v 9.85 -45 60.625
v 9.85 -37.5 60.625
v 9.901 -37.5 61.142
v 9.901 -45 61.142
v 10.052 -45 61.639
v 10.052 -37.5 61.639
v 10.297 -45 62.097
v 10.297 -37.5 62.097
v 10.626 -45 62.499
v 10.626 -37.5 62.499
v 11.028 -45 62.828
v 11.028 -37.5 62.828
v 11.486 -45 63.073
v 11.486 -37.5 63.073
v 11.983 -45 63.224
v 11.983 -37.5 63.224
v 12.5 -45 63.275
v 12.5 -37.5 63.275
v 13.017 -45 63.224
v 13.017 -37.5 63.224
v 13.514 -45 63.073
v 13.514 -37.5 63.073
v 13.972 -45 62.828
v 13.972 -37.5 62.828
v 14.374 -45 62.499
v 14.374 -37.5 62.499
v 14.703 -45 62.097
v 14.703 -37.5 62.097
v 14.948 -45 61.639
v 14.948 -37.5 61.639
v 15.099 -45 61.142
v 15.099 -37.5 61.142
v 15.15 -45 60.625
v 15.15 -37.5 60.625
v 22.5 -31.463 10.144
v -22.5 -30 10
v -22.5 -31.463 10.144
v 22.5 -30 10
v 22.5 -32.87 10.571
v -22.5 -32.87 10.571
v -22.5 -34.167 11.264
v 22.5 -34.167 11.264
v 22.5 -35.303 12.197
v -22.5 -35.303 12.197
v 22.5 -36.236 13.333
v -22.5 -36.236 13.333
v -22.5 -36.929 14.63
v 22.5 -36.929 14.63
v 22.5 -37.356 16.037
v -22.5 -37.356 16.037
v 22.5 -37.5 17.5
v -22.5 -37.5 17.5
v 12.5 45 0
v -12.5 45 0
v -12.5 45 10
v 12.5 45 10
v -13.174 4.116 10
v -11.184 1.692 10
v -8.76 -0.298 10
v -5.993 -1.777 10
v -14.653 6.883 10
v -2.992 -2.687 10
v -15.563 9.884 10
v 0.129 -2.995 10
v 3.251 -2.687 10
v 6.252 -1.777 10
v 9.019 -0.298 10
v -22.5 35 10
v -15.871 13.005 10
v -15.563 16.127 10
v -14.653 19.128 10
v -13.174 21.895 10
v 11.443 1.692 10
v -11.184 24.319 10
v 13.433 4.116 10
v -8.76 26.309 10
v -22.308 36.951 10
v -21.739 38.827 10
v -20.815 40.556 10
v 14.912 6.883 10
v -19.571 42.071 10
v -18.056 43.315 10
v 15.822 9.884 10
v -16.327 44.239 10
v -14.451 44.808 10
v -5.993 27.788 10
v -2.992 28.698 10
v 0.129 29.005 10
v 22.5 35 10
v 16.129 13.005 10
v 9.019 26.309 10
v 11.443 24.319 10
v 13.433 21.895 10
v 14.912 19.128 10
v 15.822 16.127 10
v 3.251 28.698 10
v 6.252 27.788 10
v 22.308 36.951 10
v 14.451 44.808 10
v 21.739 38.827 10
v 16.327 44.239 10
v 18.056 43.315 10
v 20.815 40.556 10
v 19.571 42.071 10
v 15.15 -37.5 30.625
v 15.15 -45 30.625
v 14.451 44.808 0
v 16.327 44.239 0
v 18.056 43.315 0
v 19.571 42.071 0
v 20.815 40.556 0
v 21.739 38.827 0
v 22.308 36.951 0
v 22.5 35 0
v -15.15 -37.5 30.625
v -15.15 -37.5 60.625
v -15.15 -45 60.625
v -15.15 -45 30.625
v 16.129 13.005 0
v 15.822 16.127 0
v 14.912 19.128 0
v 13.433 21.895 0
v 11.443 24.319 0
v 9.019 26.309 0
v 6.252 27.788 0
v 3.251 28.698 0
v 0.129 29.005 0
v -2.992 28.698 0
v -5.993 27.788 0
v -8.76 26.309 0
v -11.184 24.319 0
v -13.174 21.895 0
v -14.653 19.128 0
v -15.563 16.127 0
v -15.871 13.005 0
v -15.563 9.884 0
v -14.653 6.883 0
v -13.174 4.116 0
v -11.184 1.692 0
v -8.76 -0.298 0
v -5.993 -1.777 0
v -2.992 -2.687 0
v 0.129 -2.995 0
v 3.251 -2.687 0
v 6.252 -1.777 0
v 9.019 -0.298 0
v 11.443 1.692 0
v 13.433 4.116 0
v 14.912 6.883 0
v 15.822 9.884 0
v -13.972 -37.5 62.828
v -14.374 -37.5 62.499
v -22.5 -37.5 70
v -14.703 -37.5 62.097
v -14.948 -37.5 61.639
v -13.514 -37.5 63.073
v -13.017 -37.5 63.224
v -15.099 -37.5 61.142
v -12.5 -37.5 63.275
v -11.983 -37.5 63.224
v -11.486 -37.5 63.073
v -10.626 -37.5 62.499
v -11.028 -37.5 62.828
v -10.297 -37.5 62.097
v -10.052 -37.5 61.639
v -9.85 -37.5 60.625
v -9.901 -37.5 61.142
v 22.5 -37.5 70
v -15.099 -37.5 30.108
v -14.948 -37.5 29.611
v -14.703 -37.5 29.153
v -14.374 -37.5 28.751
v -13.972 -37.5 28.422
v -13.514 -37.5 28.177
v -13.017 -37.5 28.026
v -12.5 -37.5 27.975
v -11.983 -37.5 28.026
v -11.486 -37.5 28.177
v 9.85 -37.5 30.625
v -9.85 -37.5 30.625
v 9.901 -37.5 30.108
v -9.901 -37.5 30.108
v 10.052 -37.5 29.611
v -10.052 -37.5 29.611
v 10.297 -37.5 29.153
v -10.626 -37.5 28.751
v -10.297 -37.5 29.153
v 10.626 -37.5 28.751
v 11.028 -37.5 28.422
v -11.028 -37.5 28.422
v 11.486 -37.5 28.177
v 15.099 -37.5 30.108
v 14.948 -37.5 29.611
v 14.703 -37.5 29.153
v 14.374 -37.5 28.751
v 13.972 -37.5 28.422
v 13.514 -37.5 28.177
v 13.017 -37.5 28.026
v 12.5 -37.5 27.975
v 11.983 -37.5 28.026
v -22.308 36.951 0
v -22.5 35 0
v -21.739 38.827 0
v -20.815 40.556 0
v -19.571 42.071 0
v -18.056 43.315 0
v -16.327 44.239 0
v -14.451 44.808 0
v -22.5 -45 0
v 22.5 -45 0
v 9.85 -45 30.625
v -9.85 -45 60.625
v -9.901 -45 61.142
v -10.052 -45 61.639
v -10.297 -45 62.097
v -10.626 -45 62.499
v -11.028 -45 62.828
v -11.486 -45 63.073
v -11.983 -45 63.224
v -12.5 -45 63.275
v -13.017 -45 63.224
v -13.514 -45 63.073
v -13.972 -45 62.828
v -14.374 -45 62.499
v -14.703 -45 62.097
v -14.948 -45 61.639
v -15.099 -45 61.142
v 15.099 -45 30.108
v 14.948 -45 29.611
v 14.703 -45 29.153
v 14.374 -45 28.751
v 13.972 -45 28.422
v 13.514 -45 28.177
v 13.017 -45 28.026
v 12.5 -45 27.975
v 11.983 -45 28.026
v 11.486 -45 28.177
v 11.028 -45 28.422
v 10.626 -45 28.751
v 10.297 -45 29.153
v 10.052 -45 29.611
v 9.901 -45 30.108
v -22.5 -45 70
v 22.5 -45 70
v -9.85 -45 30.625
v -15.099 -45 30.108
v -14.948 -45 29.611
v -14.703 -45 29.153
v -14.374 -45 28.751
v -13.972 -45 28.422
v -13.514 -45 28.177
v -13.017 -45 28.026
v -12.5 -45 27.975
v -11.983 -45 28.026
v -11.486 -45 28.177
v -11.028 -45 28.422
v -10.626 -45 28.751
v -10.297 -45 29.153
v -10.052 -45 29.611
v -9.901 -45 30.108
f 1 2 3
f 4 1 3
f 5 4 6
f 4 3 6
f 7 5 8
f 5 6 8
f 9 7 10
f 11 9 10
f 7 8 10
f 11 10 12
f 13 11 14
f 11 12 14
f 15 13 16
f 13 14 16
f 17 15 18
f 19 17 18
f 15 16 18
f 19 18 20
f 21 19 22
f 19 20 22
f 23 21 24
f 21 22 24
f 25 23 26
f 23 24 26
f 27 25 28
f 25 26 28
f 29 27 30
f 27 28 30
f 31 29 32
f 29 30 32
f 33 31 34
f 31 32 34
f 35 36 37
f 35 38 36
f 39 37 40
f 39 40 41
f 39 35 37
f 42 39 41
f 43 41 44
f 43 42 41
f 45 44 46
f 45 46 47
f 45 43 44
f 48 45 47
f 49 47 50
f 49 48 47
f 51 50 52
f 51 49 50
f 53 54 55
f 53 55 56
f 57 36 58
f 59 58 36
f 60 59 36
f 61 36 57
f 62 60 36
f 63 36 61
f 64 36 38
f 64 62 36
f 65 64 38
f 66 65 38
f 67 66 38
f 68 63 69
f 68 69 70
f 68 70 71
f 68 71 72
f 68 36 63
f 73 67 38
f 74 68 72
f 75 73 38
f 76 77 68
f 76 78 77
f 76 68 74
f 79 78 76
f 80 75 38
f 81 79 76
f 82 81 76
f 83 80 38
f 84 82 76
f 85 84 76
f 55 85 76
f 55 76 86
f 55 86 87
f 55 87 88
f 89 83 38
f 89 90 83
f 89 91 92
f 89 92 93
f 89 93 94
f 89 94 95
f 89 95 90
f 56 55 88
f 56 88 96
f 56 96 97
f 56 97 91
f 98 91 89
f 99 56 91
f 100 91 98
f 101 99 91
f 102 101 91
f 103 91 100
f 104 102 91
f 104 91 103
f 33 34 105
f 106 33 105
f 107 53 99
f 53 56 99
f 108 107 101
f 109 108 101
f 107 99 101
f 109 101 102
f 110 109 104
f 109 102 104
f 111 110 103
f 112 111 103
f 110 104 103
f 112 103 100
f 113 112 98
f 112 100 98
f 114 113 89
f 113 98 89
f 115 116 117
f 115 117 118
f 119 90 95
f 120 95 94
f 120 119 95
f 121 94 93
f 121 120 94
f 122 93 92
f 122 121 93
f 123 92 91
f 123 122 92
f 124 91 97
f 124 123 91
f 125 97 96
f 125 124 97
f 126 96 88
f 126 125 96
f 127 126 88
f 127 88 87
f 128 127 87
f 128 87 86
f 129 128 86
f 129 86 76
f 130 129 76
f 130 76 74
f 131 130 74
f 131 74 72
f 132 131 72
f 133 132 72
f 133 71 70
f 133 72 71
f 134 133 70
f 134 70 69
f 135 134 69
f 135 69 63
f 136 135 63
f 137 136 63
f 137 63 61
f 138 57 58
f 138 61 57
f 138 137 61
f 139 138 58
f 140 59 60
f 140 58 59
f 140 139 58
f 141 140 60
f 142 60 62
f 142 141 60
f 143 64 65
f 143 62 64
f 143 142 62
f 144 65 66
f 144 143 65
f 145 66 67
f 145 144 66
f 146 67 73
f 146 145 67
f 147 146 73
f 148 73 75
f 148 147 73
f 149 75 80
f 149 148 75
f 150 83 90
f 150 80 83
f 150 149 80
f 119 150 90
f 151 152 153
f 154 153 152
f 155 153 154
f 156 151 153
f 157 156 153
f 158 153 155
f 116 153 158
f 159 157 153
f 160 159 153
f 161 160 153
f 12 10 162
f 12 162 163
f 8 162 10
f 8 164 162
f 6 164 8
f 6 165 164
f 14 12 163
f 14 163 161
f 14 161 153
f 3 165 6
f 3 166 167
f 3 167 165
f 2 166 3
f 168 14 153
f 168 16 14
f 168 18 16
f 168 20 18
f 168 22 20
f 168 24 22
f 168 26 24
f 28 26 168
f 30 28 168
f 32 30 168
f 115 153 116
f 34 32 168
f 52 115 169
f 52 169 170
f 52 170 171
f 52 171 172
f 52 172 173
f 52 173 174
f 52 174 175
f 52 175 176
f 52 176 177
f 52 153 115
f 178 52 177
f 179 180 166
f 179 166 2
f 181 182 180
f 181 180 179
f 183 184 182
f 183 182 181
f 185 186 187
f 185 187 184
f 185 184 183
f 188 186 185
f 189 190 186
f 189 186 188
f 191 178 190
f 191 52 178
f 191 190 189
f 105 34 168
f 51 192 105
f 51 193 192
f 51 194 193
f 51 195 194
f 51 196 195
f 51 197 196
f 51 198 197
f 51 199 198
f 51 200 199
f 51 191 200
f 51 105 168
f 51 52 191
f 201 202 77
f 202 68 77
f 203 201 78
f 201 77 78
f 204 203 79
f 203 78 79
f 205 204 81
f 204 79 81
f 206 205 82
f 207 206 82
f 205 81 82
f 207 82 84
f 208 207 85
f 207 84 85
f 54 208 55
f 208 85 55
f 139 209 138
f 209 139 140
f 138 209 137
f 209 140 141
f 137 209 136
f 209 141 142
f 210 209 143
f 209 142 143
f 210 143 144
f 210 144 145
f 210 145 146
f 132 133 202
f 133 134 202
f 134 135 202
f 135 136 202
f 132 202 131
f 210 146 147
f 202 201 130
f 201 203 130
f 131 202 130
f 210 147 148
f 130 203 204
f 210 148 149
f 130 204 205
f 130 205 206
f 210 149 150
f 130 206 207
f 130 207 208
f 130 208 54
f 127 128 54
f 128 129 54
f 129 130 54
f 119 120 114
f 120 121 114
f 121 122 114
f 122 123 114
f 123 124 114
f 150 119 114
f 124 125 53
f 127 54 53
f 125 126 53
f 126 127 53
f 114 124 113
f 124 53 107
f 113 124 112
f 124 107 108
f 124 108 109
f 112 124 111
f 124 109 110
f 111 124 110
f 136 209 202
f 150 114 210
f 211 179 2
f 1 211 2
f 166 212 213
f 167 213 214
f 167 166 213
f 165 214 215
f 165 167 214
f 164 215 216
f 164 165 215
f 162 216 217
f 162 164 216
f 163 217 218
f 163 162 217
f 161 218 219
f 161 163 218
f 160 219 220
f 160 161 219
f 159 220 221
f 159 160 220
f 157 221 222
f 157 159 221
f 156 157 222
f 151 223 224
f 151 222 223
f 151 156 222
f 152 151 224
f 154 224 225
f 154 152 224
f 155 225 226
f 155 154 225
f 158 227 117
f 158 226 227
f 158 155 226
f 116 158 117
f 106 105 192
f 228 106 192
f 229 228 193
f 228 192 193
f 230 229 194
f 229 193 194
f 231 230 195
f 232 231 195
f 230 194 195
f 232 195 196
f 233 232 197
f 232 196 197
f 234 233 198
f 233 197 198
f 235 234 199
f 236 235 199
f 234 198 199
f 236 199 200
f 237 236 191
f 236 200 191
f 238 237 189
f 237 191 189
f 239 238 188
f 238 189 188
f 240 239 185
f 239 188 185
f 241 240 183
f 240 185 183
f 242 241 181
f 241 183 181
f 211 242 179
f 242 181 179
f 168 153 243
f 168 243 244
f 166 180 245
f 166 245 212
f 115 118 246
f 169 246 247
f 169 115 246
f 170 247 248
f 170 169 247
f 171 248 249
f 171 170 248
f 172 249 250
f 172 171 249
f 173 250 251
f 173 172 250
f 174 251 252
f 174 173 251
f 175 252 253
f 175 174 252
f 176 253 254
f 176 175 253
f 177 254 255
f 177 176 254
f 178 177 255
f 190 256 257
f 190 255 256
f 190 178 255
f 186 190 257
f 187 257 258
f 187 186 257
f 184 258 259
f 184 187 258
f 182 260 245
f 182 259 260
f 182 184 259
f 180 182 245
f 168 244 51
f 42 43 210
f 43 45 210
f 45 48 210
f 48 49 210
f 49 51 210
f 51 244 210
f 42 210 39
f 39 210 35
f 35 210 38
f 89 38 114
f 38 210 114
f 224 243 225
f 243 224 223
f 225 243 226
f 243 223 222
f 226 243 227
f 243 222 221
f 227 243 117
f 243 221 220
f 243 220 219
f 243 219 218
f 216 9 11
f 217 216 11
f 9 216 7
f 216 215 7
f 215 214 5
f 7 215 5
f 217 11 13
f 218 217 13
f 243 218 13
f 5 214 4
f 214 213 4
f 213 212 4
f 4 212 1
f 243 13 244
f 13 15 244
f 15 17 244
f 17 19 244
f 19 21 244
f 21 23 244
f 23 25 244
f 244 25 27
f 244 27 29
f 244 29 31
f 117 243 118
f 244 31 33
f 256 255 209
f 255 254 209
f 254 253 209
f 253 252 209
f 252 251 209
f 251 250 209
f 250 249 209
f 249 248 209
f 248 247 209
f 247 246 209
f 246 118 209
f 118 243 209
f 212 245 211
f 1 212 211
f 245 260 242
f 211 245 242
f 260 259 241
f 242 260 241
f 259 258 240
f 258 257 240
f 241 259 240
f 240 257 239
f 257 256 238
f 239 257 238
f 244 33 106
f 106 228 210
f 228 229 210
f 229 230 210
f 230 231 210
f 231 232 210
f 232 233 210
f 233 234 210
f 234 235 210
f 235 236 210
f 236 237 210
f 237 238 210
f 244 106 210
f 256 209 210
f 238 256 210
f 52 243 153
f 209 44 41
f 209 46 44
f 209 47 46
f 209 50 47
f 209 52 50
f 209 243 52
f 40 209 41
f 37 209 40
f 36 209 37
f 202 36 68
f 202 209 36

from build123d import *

# Parameters (mm, degrees)
SKETCH1_W           = 45
SKETCH1_H           = 90
BOSS_EXTRUDE1_DEPTH = 10
SKETCH2_R           = 16
CUT_EXTRUDE1_DEPTH  = 28
FILLET1_R           = 10
SKETCH3_W           = 45
SKETCH3_H           = 7.5
BOSS_EXTRUDE2_DEPTH = 60
FILLET2_R           = 7.5
CUT_EXTRUDE2_DEPTH  = 10


with BuildPart() as part:
    # Sketch1 → Boss-Extrude1 (new body)
    with BuildSketch(Plane.XY):
        Rectangle(SKETCH1_W, SKETCH1_H)
    extrude(amount=BOSS_EXTRUDE1_DEPTH)

    # Sketch2 → Cut-Extrude1 (cut)
    with BuildSketch(Plane.XY):
        with Locations((0.129474069, 13.005480981)):
            Circle(SKETCH2_R)
    extrude(amount=CUT_EXTRUDE1_DEPTH, mode=Mode.SUBTRACT)

    # Fillet1
    fillet1_edges = [part.edges().sort_by_distance(p)[0] for p in [
        (-22.5, 45, 5),
        (22.5, 45, 5),
    ]]
    fillet(fillet1_edges, radius=FILLET1_R)

    # Sketch3 → Boss-Extrude2 (add)
    with BuildSketch(Plane.XY.offset(10)):
        with Locations((0, -41.25)):
            Rectangle(SKETCH3_W, SKETCH3_H)
    extrude(amount=BOSS_EXTRUDE2_DEPTH)

    # Fillet2
    fillet2_edges = [part.edges().sort_by_distance(p)[0] for p in [
        (0, -37.5, 10),
    ]]
    fillet(fillet2_edges, radius=FILLET2_R)

    # Sketch4 → Cut-Extrude2 (cut)
    with BuildSketch(Plane(origin=(0, -37.5, 0), x_dir=(1, 0, 0), z_dir=(0, 1, 0))):
        with BuildLine():
            Line((-9.85, -30.625), (-9.85, -60.625))
            ThreePointArc((-9.85, -60.625), (-12.5, -63.275), (-15.15, -60.625))
            Line((-15.15, -60.625), (-15.15, -30.625))
            ThreePointArc((-15.15, -30.625), (-12.5, -27.975), (-9.85, -30.625))
        make_face()
        with BuildLine():
            Line((9.85, -30.625), (9.85, -60.625))
            ThreePointArc((9.85, -60.625), (12.5, -63.275), (15.15, -60.625))
            Line((15.15, -60.625), (15.15, -30.625))
            ThreePointArc((15.15, -30.625), (12.5, -27.975), (9.85, -30.625))
        make_face()
    extrude(amount=-CUT_EXTRUDE2_DEPTH, mode=Mode.SUBTRACT)


solid = part.part
